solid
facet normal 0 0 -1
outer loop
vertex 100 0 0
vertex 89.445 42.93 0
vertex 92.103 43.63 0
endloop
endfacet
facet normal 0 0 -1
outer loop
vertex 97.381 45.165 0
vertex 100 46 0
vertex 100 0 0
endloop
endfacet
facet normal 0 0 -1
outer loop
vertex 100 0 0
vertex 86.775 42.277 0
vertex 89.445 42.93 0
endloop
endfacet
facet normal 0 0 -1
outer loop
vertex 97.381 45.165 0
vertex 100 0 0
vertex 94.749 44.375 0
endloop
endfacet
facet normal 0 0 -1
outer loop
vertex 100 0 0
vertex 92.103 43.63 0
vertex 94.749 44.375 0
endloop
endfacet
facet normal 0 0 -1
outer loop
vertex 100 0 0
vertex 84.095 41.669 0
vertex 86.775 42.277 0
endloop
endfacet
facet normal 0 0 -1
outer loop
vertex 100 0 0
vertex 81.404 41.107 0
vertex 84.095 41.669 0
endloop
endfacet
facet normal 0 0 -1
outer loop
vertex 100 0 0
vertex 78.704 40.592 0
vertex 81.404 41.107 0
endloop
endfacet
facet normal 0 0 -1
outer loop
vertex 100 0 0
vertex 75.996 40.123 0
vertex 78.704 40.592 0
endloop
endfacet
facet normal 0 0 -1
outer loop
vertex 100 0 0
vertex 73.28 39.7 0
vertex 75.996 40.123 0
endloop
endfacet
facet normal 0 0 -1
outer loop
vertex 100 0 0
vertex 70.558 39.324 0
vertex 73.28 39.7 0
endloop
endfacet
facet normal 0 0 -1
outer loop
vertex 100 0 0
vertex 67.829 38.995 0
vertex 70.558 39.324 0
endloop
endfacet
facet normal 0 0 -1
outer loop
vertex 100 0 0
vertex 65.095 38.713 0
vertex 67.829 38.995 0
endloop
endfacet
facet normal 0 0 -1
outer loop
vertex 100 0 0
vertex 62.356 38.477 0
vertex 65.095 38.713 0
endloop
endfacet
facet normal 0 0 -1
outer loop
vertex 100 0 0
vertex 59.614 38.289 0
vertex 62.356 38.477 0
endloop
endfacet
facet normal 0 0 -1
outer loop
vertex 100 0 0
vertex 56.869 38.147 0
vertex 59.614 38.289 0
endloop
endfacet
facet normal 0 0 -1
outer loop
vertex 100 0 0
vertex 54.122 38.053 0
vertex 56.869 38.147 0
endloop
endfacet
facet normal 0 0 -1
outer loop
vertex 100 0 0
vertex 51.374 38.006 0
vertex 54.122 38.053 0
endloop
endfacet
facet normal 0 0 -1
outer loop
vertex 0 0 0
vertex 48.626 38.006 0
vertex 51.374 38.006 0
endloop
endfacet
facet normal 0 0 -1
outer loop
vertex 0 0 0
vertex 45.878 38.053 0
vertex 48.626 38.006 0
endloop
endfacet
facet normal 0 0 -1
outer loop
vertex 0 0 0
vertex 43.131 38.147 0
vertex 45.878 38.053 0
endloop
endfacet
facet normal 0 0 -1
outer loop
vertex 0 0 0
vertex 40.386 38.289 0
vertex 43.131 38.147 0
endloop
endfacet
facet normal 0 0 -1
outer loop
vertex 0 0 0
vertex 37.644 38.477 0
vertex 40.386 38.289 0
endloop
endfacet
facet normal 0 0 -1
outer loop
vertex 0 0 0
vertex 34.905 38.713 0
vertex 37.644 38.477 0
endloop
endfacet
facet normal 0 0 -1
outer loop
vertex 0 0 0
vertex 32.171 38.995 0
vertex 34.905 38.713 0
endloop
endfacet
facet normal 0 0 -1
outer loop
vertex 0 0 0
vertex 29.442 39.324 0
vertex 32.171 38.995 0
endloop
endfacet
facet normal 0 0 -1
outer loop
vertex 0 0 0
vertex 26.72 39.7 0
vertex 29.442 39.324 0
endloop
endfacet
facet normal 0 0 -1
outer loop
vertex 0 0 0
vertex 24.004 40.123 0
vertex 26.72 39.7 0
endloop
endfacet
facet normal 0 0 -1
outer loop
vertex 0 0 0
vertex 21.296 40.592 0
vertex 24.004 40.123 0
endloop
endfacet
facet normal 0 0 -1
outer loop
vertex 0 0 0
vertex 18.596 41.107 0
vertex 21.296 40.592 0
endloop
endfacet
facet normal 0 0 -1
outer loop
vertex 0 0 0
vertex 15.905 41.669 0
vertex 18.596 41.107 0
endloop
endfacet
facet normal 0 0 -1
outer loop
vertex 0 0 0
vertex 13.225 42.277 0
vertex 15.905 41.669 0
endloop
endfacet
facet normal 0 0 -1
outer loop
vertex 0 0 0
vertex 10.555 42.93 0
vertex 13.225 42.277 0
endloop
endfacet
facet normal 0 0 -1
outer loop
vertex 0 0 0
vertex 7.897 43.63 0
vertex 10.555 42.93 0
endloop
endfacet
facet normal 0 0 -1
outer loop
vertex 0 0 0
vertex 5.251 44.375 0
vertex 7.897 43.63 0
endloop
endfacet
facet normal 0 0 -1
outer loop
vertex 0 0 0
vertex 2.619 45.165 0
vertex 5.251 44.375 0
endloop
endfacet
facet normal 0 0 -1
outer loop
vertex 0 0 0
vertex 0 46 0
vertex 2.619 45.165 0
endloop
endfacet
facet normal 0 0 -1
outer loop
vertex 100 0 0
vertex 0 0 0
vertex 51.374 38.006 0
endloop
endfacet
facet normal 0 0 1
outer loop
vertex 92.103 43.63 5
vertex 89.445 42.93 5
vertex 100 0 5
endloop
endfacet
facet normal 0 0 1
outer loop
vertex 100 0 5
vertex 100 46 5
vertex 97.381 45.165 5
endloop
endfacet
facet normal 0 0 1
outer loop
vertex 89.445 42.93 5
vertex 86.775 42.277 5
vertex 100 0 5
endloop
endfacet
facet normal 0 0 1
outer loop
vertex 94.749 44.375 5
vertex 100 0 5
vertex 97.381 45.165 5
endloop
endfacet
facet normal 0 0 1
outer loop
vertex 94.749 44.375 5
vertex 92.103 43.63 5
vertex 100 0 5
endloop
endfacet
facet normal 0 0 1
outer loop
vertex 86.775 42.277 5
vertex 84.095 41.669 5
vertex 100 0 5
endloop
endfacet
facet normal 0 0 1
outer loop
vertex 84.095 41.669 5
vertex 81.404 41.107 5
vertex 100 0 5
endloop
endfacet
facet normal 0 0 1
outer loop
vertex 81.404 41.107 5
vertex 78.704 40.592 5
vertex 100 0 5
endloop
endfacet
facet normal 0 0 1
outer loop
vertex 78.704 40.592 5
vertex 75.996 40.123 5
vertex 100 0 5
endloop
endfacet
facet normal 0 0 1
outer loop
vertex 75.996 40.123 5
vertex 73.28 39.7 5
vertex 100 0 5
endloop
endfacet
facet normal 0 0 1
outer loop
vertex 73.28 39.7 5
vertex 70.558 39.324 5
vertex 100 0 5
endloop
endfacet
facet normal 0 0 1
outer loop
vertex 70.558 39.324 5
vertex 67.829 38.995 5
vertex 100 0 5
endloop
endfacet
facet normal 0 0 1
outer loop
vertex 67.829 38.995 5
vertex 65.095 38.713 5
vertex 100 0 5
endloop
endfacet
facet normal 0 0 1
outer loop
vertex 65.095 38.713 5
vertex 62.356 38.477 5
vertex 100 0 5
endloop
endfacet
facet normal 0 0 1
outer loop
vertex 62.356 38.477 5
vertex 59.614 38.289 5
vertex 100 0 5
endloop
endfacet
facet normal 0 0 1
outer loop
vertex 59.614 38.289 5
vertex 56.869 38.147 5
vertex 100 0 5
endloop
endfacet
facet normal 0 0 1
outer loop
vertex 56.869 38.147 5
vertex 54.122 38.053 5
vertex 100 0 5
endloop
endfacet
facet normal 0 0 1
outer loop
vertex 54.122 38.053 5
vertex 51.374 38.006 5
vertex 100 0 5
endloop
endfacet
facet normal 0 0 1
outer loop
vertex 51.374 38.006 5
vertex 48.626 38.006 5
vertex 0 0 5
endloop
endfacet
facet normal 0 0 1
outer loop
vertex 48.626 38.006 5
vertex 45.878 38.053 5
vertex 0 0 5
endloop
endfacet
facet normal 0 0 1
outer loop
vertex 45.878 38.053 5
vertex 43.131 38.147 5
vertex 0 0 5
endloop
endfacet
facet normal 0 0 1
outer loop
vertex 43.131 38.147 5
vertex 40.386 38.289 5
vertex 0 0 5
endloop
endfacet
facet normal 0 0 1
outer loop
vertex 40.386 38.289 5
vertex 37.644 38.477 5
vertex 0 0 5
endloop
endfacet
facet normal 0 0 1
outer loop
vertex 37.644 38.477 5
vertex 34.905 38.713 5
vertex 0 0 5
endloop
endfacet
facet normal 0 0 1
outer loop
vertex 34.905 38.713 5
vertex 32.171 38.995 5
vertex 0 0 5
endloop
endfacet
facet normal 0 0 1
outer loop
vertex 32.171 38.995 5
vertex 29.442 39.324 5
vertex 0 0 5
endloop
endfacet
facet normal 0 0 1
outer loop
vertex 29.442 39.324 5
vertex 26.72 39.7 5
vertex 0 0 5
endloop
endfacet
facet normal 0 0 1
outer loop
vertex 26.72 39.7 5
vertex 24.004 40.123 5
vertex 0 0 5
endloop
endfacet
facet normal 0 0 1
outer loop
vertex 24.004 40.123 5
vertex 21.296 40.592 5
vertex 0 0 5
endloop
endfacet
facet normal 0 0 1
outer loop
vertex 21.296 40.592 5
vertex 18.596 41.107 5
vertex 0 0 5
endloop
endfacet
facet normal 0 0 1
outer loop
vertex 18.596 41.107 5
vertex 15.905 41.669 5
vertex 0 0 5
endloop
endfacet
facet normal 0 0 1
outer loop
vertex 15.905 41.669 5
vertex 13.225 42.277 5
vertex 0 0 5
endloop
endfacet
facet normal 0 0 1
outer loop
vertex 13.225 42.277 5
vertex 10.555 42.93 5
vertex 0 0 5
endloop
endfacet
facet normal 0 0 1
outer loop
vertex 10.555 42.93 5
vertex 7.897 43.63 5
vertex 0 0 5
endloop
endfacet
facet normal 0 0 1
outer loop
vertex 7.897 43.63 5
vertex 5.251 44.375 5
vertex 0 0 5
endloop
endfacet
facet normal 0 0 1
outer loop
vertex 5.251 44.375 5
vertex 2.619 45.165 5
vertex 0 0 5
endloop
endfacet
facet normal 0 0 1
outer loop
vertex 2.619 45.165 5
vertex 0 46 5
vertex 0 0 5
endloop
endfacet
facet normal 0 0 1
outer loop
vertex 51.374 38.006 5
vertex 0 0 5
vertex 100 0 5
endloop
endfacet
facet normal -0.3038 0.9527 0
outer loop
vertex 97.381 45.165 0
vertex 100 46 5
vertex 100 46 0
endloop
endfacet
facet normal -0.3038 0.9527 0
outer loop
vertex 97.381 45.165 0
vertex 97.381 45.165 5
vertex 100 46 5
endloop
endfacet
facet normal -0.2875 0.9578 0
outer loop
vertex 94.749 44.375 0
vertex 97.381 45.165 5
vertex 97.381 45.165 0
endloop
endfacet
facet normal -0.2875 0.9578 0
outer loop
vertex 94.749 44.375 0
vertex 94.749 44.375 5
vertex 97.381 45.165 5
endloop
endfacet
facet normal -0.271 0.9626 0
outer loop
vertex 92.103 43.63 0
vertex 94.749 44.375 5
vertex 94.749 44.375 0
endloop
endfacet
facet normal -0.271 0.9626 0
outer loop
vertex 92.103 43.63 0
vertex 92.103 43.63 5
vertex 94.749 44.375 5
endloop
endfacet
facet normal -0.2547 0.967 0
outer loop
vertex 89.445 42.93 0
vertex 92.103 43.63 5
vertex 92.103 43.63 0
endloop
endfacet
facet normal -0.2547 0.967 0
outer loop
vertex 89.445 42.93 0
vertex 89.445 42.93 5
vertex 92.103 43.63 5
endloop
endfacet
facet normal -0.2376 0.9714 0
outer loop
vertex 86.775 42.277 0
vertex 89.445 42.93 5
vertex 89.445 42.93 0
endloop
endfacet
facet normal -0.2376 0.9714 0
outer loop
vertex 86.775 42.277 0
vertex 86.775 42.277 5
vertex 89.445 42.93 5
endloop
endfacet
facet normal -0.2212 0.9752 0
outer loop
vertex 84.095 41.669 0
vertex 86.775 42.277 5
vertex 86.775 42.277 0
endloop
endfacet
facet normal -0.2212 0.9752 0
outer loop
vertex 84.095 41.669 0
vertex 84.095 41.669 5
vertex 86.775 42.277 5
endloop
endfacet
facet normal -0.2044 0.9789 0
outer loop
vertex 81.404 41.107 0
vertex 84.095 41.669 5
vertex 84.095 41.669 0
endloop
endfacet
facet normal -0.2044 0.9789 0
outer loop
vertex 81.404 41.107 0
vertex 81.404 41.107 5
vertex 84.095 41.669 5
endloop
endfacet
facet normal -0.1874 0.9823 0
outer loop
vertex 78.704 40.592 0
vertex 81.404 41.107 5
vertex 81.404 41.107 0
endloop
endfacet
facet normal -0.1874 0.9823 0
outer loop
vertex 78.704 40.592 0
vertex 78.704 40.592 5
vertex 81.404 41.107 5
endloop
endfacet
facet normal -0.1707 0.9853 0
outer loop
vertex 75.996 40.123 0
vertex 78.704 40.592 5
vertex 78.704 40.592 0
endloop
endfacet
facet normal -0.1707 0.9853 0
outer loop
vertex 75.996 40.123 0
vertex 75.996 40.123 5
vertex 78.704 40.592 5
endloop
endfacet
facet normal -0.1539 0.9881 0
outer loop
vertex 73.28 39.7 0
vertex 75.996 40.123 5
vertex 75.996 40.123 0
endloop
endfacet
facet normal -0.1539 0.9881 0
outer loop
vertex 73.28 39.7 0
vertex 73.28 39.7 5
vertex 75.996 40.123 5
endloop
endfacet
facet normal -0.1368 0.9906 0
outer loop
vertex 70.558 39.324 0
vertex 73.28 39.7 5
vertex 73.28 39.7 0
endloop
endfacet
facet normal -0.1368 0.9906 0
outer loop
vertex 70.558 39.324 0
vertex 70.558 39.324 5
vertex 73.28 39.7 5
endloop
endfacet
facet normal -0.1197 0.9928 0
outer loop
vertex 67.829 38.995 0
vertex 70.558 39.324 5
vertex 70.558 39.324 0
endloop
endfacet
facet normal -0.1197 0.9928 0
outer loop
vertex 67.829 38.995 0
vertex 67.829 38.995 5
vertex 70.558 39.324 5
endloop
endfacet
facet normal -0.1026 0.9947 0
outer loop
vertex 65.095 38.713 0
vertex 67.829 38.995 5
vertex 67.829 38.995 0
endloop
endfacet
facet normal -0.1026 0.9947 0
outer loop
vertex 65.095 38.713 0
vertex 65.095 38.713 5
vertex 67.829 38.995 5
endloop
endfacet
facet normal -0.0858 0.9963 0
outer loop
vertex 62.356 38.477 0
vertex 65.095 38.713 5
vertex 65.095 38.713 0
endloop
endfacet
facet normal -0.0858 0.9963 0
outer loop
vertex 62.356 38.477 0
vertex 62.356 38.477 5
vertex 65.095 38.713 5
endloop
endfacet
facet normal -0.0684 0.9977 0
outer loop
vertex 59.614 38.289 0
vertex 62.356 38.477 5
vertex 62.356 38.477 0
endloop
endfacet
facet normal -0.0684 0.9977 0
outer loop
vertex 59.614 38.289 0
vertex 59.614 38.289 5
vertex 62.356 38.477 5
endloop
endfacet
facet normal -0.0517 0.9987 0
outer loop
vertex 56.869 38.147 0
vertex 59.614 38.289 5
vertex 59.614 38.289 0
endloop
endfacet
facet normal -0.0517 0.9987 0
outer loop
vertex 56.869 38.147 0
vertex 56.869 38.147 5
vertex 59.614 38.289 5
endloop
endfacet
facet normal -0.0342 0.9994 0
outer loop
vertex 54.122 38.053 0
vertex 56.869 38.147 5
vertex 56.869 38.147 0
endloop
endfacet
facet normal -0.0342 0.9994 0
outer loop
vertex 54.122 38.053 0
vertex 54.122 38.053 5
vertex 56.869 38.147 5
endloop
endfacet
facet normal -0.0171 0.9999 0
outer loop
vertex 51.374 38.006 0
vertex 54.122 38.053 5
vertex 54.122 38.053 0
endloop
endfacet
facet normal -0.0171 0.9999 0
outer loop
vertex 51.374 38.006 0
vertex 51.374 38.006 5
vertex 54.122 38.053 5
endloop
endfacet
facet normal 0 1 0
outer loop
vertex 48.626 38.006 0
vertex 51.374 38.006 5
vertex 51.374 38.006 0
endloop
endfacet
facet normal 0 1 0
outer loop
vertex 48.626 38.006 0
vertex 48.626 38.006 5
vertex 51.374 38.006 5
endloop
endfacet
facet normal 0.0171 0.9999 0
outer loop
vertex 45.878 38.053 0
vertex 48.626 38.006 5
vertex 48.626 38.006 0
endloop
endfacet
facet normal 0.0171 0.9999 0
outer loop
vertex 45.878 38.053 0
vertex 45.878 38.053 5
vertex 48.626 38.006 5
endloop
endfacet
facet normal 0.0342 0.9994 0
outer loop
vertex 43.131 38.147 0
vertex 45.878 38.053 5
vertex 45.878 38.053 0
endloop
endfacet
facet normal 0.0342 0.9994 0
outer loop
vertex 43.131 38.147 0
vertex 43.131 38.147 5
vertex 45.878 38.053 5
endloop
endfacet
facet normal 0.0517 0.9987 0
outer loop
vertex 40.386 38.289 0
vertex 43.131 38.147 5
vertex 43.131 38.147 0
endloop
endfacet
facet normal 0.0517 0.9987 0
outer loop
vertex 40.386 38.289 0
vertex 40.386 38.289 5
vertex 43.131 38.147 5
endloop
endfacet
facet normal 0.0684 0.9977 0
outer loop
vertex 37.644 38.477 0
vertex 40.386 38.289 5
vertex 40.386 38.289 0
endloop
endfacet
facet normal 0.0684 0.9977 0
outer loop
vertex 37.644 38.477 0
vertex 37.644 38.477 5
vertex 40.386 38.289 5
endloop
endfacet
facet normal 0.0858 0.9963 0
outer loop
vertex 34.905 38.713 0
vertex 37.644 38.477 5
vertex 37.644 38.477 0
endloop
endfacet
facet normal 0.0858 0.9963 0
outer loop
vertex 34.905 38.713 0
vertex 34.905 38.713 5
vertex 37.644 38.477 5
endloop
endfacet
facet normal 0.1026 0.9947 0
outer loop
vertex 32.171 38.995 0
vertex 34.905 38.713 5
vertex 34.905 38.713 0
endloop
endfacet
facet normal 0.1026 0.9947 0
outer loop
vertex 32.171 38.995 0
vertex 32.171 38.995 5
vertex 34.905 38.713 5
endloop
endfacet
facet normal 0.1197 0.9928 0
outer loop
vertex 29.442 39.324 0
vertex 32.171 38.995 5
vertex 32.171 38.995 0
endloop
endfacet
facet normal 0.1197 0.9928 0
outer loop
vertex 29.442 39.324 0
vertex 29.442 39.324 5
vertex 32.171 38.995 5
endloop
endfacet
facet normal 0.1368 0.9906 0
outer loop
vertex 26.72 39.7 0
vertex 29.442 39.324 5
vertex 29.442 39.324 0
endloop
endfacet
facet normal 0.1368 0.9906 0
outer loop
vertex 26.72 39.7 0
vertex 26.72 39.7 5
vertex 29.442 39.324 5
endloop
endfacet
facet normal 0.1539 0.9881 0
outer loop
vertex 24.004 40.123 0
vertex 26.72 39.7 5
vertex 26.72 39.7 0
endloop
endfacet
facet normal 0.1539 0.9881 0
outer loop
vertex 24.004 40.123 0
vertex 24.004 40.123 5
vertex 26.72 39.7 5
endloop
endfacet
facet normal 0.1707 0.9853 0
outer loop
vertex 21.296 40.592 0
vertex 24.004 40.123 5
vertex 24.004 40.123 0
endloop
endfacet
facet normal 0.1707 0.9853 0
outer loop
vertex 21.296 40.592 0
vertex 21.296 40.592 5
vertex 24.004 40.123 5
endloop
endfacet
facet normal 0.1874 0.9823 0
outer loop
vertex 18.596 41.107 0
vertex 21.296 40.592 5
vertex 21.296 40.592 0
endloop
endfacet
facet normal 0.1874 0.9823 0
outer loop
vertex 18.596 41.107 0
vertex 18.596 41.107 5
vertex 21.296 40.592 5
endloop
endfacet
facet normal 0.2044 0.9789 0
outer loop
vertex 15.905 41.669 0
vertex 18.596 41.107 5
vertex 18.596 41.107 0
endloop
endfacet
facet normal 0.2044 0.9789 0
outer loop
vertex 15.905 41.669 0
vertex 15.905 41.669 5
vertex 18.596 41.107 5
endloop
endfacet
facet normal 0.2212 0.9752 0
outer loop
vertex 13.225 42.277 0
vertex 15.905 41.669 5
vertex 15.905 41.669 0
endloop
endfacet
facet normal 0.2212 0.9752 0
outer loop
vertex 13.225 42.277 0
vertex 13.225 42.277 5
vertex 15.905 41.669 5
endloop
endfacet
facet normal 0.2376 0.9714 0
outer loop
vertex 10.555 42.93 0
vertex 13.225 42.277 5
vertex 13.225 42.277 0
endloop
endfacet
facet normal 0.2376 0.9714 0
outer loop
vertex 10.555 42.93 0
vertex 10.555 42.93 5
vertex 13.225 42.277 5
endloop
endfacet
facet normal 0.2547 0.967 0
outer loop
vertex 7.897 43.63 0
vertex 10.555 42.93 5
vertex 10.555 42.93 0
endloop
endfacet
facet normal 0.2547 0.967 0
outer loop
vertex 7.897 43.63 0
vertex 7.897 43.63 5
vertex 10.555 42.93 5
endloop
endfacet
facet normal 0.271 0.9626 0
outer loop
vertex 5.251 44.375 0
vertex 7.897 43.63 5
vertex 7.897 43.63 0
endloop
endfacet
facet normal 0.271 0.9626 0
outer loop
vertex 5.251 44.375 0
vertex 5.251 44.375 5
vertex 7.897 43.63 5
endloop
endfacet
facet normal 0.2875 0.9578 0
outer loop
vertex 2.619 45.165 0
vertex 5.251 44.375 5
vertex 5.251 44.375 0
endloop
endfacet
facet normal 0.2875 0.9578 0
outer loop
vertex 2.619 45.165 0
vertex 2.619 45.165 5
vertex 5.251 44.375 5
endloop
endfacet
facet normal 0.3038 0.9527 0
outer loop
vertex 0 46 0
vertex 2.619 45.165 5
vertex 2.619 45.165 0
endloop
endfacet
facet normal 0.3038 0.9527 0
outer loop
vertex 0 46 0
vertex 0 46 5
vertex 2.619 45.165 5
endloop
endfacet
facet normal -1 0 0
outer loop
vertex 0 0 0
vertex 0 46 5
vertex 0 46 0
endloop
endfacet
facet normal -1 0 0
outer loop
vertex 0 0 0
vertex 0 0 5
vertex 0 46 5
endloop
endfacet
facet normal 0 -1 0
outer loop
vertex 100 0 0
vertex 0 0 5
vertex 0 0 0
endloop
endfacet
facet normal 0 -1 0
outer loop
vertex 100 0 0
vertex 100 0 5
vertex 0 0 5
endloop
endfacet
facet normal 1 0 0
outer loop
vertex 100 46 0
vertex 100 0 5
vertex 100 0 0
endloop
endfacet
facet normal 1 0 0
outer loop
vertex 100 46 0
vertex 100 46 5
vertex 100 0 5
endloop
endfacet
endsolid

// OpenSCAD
$fn = 32;

// ----------------------------------------------------------------------
// Arc profile plate: notch, 40 points
// ----------------------------------------------------------------------

// --- parameters (mm) ---
bar_l = 100;              // bar length, X
bar_w = 46;               // bar width, Y
notch_depth = 8;          // depth of the arc notch at mid-span
arc_r = 160.25;           // radius of the notch arc
arc_angle = 36.36;        // notch arc angle, degrees
arc_step = 1;             // sampling step of the notch arc, degrees
plate_t = 5;              // plate thickness, Z

profile = [[0, 0], [100, 0], [100, 46], [97.381, 45.165], [94.749, 44.375], [92.103, 43.63], [89.445, 42.93], [86.775, 42.277], [84.095, 41.669], [81.404, 41.107], [78.704, 40.592], [75.996, 40.123], [73.28, 39.7], [70.558, 39.324], [67.829, 38.995], [65.095, 38.713], [62.356, 38.477], [59.614, 38.289], [56.869, 38.147], [54.122, 38.053], [51.374, 38.006], [48.626, 38.006], [45.878, 38.053], [43.131, 38.147], [40.386, 38.289], [37.644, 38.477], [34.905, 38.713], [32.171, 38.995], [29.442, 39.324], [26.72, 39.7], [24.004, 40.123], [21.296, 40.592], [18.596, 41.107], [15.905, 41.669], [13.225, 42.277], [10.555, 42.93], [7.897, 43.63], [5.251, 44.375], [2.619, 45.165], [0, 46]];  // primary outline, 40 points, counter clockwise

// --- the one profile operation ---
linear_extrude(height = plate_t) polygon(points = profile);
